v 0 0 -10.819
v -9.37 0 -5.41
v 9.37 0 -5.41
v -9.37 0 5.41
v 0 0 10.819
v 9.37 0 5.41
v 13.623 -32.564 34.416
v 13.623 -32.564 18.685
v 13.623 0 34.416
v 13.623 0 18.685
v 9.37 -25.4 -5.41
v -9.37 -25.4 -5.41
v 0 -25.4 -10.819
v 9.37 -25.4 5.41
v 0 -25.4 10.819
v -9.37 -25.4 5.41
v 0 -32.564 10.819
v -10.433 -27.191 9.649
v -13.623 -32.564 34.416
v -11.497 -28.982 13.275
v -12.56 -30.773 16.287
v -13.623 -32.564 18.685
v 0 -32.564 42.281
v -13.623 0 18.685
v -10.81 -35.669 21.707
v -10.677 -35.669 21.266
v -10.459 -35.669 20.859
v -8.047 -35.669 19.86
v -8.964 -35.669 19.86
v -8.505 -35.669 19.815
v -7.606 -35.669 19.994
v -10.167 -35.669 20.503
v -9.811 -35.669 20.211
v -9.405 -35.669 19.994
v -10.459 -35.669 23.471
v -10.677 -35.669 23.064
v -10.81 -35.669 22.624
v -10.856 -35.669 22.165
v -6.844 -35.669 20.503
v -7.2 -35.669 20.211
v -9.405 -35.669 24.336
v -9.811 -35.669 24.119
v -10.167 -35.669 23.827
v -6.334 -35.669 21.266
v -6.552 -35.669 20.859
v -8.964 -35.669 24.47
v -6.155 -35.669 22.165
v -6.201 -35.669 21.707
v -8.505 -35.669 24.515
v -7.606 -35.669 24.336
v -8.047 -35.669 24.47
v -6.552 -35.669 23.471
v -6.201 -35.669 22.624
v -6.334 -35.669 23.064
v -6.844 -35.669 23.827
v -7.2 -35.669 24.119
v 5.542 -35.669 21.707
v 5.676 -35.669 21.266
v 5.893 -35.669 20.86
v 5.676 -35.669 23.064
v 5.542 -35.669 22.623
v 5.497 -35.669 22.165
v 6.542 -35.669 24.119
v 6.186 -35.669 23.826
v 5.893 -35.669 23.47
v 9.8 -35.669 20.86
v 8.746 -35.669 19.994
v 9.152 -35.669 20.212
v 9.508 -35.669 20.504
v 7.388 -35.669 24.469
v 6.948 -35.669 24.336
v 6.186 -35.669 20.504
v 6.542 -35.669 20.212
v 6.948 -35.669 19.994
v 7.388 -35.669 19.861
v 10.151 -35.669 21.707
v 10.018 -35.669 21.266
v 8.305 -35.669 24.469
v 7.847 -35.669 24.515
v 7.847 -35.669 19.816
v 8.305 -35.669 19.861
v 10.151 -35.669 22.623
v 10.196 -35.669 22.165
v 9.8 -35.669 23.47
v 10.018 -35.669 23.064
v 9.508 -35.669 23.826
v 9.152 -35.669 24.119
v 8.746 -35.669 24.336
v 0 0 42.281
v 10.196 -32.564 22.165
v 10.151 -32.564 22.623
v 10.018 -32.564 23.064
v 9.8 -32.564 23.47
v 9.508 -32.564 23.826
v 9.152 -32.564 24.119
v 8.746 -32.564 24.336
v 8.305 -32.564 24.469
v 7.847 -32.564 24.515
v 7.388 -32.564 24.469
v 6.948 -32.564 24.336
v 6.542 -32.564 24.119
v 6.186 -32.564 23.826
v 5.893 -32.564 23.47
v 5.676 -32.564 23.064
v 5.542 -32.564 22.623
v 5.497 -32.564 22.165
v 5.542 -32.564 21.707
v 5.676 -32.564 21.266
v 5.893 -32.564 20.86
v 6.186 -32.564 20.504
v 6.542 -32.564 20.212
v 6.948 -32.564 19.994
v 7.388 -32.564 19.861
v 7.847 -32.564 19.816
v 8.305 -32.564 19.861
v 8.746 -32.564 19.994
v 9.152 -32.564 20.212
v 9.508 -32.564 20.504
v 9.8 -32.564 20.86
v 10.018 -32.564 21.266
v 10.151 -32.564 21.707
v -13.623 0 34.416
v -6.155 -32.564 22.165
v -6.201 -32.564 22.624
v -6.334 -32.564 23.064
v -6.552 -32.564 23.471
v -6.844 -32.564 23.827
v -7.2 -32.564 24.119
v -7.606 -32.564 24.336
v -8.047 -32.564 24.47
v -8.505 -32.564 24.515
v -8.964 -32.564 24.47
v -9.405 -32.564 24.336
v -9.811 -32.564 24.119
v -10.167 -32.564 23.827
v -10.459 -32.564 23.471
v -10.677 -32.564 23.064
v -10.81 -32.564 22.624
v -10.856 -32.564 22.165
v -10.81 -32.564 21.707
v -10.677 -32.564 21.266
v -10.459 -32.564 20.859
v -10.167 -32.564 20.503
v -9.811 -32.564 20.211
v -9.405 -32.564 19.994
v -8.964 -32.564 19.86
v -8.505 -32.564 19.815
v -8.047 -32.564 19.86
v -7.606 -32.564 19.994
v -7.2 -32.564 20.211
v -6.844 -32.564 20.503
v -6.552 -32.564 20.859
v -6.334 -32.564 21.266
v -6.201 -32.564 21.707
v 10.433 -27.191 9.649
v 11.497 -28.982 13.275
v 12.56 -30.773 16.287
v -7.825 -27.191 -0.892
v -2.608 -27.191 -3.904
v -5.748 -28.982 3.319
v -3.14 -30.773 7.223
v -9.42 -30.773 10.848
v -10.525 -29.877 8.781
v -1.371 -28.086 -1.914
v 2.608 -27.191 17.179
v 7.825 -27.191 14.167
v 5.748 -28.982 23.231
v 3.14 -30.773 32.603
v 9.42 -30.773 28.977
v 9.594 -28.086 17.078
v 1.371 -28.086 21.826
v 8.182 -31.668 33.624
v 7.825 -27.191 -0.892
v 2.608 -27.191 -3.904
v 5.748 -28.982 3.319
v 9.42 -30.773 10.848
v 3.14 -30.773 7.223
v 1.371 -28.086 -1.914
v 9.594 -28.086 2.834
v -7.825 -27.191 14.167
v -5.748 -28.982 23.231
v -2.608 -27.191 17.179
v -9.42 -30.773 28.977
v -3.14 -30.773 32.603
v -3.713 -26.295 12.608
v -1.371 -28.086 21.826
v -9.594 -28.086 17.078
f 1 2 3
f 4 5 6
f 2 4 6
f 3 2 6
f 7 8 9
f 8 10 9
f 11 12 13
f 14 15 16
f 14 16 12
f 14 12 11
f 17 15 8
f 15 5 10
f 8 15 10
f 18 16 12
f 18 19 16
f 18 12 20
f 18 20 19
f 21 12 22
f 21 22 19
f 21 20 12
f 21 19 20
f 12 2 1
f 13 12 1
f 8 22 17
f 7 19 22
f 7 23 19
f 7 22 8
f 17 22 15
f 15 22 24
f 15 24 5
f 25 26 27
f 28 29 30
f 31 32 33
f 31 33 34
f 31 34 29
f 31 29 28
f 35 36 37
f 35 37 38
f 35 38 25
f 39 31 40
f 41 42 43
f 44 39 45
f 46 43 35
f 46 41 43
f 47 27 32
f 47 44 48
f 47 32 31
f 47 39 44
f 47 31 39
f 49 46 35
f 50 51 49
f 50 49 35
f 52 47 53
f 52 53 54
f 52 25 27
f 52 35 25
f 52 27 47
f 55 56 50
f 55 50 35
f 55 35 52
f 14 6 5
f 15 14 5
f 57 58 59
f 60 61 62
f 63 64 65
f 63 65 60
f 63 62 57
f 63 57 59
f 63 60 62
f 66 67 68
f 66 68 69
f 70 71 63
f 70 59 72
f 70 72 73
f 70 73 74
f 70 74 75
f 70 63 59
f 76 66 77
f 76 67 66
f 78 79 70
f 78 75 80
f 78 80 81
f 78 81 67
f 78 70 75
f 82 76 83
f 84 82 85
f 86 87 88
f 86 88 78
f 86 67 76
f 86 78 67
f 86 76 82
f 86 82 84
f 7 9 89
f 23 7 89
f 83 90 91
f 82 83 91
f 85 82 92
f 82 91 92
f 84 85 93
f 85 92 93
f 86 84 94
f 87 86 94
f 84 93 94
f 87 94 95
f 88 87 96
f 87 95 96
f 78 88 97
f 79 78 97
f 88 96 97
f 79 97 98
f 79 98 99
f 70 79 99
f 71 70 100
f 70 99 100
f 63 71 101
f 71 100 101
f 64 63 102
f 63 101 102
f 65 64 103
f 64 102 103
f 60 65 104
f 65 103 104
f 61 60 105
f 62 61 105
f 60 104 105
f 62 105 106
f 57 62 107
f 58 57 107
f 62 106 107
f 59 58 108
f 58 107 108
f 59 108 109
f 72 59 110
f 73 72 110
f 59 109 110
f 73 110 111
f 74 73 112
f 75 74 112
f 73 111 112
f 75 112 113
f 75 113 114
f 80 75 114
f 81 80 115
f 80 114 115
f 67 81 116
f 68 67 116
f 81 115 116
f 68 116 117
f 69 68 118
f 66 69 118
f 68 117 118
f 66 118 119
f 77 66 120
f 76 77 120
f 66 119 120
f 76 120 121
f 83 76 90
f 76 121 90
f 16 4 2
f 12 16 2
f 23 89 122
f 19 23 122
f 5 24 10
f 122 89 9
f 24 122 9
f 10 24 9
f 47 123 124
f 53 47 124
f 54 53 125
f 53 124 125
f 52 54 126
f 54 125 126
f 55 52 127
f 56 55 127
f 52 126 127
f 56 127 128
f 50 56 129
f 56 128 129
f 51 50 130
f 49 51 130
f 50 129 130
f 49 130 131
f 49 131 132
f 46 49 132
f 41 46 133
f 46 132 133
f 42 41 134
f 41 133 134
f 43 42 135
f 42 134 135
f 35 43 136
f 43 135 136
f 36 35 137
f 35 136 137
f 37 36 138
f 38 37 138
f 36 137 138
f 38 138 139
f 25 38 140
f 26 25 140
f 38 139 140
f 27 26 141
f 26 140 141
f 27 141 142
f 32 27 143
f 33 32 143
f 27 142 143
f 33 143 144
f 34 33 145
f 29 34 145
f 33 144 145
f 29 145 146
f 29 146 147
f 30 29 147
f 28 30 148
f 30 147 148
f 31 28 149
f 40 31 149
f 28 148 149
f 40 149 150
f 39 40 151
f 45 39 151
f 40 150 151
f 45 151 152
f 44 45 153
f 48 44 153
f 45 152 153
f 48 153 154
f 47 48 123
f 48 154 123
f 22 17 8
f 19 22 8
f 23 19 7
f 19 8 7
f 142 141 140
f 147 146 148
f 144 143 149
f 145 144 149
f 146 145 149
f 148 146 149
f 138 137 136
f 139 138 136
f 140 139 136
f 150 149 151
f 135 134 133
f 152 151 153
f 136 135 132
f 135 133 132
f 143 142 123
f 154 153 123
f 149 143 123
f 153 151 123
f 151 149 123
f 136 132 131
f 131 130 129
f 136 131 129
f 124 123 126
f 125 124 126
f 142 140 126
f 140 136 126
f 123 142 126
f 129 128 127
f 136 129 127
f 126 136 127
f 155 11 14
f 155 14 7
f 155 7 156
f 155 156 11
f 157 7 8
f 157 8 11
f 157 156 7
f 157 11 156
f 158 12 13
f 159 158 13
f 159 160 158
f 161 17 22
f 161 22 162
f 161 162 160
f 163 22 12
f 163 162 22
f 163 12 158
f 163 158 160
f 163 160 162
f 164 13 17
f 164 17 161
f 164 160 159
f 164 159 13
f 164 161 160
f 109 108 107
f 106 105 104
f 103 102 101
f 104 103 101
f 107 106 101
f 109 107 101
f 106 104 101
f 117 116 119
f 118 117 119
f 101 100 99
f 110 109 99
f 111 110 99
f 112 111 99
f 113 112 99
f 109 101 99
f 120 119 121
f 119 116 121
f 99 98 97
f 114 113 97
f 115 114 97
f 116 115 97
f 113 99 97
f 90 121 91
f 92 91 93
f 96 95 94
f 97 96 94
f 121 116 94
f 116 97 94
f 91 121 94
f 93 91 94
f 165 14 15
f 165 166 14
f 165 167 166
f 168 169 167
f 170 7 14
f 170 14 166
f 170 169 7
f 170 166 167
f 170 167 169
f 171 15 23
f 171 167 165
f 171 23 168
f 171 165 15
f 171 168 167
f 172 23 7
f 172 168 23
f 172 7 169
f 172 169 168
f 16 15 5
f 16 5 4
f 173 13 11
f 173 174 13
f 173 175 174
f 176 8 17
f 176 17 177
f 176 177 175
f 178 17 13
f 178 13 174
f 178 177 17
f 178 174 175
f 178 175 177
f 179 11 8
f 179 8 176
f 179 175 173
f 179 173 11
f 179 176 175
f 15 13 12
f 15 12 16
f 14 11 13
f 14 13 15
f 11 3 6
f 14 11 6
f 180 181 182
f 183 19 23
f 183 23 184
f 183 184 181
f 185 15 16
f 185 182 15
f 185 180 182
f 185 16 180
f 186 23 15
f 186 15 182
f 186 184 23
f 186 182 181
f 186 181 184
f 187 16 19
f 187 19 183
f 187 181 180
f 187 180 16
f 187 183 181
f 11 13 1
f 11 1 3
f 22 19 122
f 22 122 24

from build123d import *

# Parameters (mm, degrees)
F1_DEPTH = 25.4
F3_DEPTH = 7.16379
F5_R     = 2.3500248861
F6_DEPTH = 3.10498
F5_R_2   = 2.3495


with BuildPart() as f1:
    # F0 (on Front) → F1 (new body)
    with BuildSketch(Plane.XZ):
        Polygon((-13.623206395, 18.6848178587), (0, 10.8194559793), (13.623206395, 18.6848178587), (13.623206395, 34.4155416175), (0, 42.2809034969), (-13.623206395, 34.4155416175), align=None)
    extrude(amount=F1_DEPTH)



with BuildPart() as f1b:
    # F0 (on Front) → F1, piece 2 (new body)
    with BuildSketch(Plane.XZ):
        Polygon((9.3699237332, -5.4097279896), (9.3699237332, 5.4097279896), (0, 10.8194559793), (-9.3699237332, 5.4097279896), (-9.3699237332, -5.4097279896), (0, -10.8194559793), align=None)
    extrude(amount=F1_DEPTH)


with BuildPart() as f1_1:
    add(f1.part)

    add(f1b.part)  # F3 merges F1b
    # F2 (on face) → F3 (join)
    with BuildSketch(Plane.XZ.offset(25.4)):
        Polygon((-13.623206395, 34.4155416175), (-13.623206395, 18.6848178587), (0, 10.8194559793), (13.623206395, 18.6848178587), (13.623206395, 34.4155416175), (0, 42.2809034969), align=None)
    extrude(amount=F3_DEPTH)


with BuildPart() as f4:
    # F1_face (on face) → F4 section 0
    with BuildSketch(Plane(origin=(0, -25.4, 26.5501797381), x_dir=(1, 0, 0), z_dir=(0, -1, 0))):
        Polygon((0, -37.3696357173), (9.3699237332, -31.9599077277), (9.3699237332, -21.1404517484), (0, -15.7307237588), (-9.3699237332, -21.1404517484), (-9.3699237332, -31.9599077277), align=None)
    # F3_face (on face) → F4 section 1
    with BuildSketch(Plane(origin=(0, -32.56379, 26.5501797381), x_dir=(1, 0, 0), z_dir=(0, -1, 0))):
        Polygon((-13.623206395, 7.8653618794), (-13.623206395, -7.8653618794), (0, -15.7307237588), (13.623206395, -7.8653618794), (13.623206395, 7.8653618794), (0, 15.7307237588), align=None)
    loft()


with BuildPart() as f6:
    # F5 (on face) → F6 (new body)
    with BuildSketch(Plane.XZ.offset(32.56379)):
        with Locations((-8.5054952651, 22.1650754418)):
            Circle(F5_R)
    extrude(amount=F6_DEPTH)


with BuildPart() as f6b:
    # F5 (on face) → F6, piece 2 (new body)
    with BuildSketch(Plane.XZ.offset(32.56379)):
        with Locations((7.8468539937, 22.1650754418)):
            Circle(F5_R_2)
    extrude(amount=F6_DEPTH)


solid = Compound([f1_1.part, f4.part, f6.part, f6b.part])
